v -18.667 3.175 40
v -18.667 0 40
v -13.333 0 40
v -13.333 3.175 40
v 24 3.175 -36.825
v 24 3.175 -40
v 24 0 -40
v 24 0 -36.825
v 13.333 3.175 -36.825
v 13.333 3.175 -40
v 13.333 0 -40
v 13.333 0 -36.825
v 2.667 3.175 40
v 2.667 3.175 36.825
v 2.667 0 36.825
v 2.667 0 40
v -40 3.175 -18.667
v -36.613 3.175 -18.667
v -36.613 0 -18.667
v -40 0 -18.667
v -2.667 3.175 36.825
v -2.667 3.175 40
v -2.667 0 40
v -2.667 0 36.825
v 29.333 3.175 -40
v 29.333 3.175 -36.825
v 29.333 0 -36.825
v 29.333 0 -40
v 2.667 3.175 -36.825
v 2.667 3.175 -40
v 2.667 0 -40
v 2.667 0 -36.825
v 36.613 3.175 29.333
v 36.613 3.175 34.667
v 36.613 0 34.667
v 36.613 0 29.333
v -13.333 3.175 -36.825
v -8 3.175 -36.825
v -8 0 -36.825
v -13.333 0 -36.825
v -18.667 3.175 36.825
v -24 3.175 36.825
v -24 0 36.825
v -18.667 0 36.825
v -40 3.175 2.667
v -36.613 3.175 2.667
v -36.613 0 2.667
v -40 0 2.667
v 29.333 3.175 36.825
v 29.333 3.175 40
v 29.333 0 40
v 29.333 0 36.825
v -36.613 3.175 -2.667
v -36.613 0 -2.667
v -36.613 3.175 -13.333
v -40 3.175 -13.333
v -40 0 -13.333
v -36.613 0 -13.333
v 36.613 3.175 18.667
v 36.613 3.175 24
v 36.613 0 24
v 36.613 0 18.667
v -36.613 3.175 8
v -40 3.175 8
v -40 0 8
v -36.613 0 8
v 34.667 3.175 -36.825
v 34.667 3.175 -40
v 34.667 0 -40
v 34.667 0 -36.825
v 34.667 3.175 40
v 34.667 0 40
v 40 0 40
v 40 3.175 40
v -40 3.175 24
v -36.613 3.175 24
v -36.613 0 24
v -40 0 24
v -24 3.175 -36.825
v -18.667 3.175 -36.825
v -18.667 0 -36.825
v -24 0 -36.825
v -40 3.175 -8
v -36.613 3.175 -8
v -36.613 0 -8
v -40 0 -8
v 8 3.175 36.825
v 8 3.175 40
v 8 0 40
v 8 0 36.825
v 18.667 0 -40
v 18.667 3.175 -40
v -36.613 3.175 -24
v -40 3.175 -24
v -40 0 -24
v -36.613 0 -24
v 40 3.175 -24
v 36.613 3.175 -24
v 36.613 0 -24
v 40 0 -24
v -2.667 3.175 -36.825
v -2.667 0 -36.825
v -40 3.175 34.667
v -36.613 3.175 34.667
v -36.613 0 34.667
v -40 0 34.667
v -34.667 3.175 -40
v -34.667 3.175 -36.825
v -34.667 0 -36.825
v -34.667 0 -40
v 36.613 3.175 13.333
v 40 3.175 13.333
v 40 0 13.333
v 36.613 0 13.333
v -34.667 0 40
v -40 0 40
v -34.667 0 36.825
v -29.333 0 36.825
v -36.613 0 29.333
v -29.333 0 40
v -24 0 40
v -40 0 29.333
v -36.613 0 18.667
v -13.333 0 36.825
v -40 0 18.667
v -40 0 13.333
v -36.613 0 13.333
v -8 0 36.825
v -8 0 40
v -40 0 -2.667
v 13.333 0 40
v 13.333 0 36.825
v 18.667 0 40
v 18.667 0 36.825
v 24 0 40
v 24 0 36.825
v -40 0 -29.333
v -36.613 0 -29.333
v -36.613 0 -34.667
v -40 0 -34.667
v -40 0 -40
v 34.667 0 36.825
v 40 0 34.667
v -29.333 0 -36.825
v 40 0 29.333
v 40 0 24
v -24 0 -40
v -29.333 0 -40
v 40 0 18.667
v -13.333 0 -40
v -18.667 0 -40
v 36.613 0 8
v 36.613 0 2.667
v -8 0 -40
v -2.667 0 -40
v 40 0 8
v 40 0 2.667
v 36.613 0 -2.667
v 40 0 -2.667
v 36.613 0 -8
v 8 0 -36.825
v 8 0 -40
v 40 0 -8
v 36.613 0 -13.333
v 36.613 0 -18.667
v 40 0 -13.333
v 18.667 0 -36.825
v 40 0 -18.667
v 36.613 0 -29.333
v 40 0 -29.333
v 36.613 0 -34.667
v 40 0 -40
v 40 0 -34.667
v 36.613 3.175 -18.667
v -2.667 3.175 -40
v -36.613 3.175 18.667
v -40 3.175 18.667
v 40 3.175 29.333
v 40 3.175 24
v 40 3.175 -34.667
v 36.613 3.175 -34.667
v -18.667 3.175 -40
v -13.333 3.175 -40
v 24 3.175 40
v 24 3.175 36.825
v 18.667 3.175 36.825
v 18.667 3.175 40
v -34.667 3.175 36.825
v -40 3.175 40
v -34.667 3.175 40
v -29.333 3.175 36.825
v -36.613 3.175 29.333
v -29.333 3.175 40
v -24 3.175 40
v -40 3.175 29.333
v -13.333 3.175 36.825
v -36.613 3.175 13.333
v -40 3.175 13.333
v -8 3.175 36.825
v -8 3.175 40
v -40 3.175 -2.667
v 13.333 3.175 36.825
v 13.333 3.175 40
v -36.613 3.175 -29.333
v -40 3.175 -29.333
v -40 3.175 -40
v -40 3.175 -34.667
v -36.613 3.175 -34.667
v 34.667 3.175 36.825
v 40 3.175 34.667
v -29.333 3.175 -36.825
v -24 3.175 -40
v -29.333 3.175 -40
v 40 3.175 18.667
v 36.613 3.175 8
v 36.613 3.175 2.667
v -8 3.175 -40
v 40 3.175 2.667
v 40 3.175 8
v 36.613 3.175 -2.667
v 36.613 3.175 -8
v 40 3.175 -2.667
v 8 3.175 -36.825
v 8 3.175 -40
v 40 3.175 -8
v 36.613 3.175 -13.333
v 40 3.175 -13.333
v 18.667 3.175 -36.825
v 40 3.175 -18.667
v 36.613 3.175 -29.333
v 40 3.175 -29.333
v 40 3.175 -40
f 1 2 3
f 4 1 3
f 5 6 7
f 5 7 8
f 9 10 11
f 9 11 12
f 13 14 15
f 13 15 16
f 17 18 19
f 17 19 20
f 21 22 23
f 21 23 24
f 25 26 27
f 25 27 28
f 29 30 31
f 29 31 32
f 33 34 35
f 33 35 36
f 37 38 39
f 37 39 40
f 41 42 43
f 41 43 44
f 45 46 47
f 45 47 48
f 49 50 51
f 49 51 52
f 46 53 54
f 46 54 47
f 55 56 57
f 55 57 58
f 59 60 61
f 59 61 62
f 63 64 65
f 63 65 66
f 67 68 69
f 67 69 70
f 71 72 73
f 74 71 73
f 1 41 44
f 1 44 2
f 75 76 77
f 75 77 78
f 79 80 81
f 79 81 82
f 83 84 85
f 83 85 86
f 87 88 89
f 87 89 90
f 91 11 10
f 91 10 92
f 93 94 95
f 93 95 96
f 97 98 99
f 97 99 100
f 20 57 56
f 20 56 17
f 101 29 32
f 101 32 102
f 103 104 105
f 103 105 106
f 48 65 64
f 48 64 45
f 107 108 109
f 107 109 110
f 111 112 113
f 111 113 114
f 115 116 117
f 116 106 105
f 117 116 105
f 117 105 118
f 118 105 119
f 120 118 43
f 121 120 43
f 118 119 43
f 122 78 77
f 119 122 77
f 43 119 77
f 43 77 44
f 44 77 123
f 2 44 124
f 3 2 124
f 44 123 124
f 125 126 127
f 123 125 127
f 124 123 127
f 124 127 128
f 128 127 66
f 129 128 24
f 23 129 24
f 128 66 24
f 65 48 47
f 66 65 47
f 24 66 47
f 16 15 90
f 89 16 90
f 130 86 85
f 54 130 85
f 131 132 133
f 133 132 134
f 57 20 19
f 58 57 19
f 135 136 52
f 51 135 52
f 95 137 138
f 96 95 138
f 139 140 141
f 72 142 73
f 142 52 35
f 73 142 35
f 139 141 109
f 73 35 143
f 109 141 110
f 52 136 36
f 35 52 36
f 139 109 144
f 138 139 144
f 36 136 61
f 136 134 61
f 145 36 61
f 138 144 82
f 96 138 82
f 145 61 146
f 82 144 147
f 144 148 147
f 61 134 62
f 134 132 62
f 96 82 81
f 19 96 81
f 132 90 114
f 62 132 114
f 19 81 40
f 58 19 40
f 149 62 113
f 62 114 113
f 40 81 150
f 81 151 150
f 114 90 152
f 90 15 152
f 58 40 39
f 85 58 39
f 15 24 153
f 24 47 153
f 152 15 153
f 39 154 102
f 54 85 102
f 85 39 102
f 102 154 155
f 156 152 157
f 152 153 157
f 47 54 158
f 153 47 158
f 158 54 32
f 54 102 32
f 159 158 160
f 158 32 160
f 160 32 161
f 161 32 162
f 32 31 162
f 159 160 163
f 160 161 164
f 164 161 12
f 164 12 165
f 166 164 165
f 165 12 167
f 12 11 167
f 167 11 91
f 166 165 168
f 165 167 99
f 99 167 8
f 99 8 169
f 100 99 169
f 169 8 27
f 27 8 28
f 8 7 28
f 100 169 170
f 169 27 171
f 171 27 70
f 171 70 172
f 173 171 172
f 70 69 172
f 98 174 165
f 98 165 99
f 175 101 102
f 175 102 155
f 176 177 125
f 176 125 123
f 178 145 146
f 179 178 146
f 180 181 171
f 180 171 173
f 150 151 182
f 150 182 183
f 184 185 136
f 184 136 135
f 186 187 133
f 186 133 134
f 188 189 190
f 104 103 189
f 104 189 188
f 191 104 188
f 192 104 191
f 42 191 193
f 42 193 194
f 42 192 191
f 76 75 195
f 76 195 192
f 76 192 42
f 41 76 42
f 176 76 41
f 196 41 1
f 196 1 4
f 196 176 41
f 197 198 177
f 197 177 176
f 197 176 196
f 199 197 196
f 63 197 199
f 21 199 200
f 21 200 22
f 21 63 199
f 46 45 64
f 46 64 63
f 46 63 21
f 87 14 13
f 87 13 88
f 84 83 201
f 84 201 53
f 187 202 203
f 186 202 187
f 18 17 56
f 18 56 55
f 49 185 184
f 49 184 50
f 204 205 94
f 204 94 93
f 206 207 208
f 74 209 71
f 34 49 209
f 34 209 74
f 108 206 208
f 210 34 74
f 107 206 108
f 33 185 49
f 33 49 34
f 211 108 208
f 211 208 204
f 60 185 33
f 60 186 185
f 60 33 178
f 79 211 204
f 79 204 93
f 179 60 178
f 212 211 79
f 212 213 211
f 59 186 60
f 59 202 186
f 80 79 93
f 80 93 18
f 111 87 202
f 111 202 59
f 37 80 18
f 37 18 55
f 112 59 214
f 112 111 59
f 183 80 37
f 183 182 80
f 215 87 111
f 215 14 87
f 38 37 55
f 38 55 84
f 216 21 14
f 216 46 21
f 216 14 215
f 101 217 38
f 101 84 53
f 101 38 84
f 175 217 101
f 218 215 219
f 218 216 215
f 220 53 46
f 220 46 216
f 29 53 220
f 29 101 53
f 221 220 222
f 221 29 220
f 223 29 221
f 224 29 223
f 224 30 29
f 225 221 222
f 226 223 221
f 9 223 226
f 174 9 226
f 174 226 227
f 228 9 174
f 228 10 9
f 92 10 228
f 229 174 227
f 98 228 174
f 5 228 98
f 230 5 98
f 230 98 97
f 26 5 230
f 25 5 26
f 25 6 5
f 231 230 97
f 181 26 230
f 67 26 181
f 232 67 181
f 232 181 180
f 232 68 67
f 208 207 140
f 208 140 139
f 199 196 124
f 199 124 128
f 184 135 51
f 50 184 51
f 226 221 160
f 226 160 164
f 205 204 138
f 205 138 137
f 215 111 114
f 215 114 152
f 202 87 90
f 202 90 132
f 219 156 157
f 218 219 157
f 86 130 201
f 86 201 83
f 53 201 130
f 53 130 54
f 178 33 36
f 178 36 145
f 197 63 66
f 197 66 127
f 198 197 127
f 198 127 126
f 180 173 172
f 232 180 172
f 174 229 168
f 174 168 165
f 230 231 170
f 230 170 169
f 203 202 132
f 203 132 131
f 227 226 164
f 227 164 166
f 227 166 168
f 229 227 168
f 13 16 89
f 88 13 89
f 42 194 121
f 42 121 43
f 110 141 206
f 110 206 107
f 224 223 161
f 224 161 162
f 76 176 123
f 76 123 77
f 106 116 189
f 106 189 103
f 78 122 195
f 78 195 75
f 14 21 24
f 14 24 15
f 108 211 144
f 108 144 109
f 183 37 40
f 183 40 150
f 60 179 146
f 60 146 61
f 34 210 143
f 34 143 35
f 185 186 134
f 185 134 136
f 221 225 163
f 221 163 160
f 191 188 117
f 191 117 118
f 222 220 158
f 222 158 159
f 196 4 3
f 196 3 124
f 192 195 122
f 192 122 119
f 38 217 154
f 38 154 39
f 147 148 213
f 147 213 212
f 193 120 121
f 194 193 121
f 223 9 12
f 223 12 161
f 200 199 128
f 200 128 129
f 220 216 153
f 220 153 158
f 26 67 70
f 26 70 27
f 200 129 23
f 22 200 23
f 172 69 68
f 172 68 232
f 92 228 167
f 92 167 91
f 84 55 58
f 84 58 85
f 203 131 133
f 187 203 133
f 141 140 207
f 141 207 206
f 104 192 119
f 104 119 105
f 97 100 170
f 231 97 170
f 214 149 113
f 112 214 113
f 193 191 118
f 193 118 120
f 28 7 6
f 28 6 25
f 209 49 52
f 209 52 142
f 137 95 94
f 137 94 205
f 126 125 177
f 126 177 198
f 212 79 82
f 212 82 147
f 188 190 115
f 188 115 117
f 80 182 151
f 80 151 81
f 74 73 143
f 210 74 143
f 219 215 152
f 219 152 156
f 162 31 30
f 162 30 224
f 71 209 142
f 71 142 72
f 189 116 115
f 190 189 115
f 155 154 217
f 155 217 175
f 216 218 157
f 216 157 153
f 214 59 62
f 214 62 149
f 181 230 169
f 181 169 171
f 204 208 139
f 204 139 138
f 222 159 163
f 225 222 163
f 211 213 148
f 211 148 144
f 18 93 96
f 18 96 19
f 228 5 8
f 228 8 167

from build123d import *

# Parameters (mm, degrees)
SKETCH1_W           = 80
SKETCH1_H           = 80
BOSS_EXTRUDE1_DEPTH = 3.175
SKETCH3_OUTSIDE_W   = 104.636
SKETCH3_OUTSIDE_H   = 104.636
CUT_EXTRUDE1_DEPTH  = 57.657573413


with BuildPart() as part:
    # Sketch1 → Boss-Extrude1 (new body)
    with BuildSketch(Plane(origin=(0, 0, 0), x_dir=(1, 0, 0), z_dir=(0, 1, 0))):
        Rectangle(SKETCH1_W, SKETCH1_H)
    extrude(amount=BOSS_EXTRUDE1_DEPTH)

    # Sketch3 outside → Cut-Extrude1 (cut, through all)
    with BuildSketch(Plane(origin=(0, 3.175, 0), x_dir=(1, 0, 0), z_dir=(0, 1, 0))):
        Rectangle(SKETCH3_OUTSIDE_W, SKETCH3_OUTSIDE_H)
        Polygon((-40, -40), (-34.666666667, -40), (-34.666666667, -36.825), (-29.333333333, -36.825), (-29.333333333, -40), (-24, -40), (-24, -36.825), (-18.666666667, -36.825), (-18.666666667, -40), (-13.333333333, -40), (-13.333333333, -36.825), (-8, -36.825), (-8, -40), (-2.666666667, -40), (-2.666666667, -36.825), (2.666666667, -36.825), (2.666666667, -40), (8, -40), (8, -36.825), (13.333333333, -36.825), (13.333333333, -40), (18.666666667, -40), (18.666666667, -36.825), (24, -36.825), (24, -40), (29.333333333, -40), (29.333333333, -36.825), (34.666666667, -36.825), (34.666666667, -40), (40, -40), (40, -34.666666667), (36.613333333, -34.666666667), (36.613333333, -29.333333333), (40, -29.333333333), (40, -24), (36.613333333, -24), (36.613333333, -18.666666667), (40, -18.666666667), (40, -13.333333333), (36.613333333, -13.333333333), (36.613333333, -8), (40, -8), (40, -2.666666667), (36.613333333, -2.666666667), (36.613333333, 2.666666667), (40, 2.666666667), (40, 8), (36.613333333, 8), (36.613333333, 13.333333333), (40, 13.333333333), (40, 18.666666667), (36.613333333, 18.666666667), (36.613333333, 24), (40, 24), (40, 29.333333333), (36.613333333, 29.333333333), (36.613333333, 34.666666667), (40, 34.666666667), (40, 40), (34.666666667, 40), (34.666666667, 36.825), (29.333333333, 36.825), (29.333333333, 40), (24, 40), (24, 36.825), (18.666666667, 36.825), (18.666666667, 40), (13.333333333, 40), (13.333333333, 36.825), (8, 36.825), (8, 40), (2.666666667, 40), (2.666666667, 36.825), (-2.666666667, 36.825), (-2.666666667, 40), (-8, 40), (-8, 36.825), (-13.333333333, 36.825), (-13.333333333, 40), (-18.666666667, 40), (-18.666666667, 36.825), (-24, 36.825), (-24, 40), (-29.333333333, 40), (-29.333333333, 36.825), (-34.666666667, 36.825), (-34.666666667, 40), (-40, 40), (-40, 34.666666667), (-36.613333333, 34.666666667), (-36.613333333, 29.333333333), (-40, 29.333333333), (-40, 24), (-36.613333333, 24), (-36.613333333, 18.666666667), (-40, 18.666666667), (-40, 13.333333333), (-36.613333333, 13.333333333), (-36.613333333, 8), (-40, 8), (-40, 2.666666667), (-36.613333333, 2.666666667), (-36.613333333, -2.666666667), (-40, -2.666666667), (-40, -8), (-36.613333333, -8), (-36.613333333, -13.333333333), (-40, -13.333333333), (-40, -18.666666667), (-36.613333333, -18.666666667), (-36.613333333, -24), (-40, -24), (-40, -29.333333333), (-36.613333333, -29.333333333), (-36.613333333, -34.666666667), (-40, -34.666666667), align=None, mode=Mode.SUBTRACT)
    extrude(amount=-CUT_EXTRUDE1_DEPTH, mode=Mode.SUBTRACT)


solid = part.part
